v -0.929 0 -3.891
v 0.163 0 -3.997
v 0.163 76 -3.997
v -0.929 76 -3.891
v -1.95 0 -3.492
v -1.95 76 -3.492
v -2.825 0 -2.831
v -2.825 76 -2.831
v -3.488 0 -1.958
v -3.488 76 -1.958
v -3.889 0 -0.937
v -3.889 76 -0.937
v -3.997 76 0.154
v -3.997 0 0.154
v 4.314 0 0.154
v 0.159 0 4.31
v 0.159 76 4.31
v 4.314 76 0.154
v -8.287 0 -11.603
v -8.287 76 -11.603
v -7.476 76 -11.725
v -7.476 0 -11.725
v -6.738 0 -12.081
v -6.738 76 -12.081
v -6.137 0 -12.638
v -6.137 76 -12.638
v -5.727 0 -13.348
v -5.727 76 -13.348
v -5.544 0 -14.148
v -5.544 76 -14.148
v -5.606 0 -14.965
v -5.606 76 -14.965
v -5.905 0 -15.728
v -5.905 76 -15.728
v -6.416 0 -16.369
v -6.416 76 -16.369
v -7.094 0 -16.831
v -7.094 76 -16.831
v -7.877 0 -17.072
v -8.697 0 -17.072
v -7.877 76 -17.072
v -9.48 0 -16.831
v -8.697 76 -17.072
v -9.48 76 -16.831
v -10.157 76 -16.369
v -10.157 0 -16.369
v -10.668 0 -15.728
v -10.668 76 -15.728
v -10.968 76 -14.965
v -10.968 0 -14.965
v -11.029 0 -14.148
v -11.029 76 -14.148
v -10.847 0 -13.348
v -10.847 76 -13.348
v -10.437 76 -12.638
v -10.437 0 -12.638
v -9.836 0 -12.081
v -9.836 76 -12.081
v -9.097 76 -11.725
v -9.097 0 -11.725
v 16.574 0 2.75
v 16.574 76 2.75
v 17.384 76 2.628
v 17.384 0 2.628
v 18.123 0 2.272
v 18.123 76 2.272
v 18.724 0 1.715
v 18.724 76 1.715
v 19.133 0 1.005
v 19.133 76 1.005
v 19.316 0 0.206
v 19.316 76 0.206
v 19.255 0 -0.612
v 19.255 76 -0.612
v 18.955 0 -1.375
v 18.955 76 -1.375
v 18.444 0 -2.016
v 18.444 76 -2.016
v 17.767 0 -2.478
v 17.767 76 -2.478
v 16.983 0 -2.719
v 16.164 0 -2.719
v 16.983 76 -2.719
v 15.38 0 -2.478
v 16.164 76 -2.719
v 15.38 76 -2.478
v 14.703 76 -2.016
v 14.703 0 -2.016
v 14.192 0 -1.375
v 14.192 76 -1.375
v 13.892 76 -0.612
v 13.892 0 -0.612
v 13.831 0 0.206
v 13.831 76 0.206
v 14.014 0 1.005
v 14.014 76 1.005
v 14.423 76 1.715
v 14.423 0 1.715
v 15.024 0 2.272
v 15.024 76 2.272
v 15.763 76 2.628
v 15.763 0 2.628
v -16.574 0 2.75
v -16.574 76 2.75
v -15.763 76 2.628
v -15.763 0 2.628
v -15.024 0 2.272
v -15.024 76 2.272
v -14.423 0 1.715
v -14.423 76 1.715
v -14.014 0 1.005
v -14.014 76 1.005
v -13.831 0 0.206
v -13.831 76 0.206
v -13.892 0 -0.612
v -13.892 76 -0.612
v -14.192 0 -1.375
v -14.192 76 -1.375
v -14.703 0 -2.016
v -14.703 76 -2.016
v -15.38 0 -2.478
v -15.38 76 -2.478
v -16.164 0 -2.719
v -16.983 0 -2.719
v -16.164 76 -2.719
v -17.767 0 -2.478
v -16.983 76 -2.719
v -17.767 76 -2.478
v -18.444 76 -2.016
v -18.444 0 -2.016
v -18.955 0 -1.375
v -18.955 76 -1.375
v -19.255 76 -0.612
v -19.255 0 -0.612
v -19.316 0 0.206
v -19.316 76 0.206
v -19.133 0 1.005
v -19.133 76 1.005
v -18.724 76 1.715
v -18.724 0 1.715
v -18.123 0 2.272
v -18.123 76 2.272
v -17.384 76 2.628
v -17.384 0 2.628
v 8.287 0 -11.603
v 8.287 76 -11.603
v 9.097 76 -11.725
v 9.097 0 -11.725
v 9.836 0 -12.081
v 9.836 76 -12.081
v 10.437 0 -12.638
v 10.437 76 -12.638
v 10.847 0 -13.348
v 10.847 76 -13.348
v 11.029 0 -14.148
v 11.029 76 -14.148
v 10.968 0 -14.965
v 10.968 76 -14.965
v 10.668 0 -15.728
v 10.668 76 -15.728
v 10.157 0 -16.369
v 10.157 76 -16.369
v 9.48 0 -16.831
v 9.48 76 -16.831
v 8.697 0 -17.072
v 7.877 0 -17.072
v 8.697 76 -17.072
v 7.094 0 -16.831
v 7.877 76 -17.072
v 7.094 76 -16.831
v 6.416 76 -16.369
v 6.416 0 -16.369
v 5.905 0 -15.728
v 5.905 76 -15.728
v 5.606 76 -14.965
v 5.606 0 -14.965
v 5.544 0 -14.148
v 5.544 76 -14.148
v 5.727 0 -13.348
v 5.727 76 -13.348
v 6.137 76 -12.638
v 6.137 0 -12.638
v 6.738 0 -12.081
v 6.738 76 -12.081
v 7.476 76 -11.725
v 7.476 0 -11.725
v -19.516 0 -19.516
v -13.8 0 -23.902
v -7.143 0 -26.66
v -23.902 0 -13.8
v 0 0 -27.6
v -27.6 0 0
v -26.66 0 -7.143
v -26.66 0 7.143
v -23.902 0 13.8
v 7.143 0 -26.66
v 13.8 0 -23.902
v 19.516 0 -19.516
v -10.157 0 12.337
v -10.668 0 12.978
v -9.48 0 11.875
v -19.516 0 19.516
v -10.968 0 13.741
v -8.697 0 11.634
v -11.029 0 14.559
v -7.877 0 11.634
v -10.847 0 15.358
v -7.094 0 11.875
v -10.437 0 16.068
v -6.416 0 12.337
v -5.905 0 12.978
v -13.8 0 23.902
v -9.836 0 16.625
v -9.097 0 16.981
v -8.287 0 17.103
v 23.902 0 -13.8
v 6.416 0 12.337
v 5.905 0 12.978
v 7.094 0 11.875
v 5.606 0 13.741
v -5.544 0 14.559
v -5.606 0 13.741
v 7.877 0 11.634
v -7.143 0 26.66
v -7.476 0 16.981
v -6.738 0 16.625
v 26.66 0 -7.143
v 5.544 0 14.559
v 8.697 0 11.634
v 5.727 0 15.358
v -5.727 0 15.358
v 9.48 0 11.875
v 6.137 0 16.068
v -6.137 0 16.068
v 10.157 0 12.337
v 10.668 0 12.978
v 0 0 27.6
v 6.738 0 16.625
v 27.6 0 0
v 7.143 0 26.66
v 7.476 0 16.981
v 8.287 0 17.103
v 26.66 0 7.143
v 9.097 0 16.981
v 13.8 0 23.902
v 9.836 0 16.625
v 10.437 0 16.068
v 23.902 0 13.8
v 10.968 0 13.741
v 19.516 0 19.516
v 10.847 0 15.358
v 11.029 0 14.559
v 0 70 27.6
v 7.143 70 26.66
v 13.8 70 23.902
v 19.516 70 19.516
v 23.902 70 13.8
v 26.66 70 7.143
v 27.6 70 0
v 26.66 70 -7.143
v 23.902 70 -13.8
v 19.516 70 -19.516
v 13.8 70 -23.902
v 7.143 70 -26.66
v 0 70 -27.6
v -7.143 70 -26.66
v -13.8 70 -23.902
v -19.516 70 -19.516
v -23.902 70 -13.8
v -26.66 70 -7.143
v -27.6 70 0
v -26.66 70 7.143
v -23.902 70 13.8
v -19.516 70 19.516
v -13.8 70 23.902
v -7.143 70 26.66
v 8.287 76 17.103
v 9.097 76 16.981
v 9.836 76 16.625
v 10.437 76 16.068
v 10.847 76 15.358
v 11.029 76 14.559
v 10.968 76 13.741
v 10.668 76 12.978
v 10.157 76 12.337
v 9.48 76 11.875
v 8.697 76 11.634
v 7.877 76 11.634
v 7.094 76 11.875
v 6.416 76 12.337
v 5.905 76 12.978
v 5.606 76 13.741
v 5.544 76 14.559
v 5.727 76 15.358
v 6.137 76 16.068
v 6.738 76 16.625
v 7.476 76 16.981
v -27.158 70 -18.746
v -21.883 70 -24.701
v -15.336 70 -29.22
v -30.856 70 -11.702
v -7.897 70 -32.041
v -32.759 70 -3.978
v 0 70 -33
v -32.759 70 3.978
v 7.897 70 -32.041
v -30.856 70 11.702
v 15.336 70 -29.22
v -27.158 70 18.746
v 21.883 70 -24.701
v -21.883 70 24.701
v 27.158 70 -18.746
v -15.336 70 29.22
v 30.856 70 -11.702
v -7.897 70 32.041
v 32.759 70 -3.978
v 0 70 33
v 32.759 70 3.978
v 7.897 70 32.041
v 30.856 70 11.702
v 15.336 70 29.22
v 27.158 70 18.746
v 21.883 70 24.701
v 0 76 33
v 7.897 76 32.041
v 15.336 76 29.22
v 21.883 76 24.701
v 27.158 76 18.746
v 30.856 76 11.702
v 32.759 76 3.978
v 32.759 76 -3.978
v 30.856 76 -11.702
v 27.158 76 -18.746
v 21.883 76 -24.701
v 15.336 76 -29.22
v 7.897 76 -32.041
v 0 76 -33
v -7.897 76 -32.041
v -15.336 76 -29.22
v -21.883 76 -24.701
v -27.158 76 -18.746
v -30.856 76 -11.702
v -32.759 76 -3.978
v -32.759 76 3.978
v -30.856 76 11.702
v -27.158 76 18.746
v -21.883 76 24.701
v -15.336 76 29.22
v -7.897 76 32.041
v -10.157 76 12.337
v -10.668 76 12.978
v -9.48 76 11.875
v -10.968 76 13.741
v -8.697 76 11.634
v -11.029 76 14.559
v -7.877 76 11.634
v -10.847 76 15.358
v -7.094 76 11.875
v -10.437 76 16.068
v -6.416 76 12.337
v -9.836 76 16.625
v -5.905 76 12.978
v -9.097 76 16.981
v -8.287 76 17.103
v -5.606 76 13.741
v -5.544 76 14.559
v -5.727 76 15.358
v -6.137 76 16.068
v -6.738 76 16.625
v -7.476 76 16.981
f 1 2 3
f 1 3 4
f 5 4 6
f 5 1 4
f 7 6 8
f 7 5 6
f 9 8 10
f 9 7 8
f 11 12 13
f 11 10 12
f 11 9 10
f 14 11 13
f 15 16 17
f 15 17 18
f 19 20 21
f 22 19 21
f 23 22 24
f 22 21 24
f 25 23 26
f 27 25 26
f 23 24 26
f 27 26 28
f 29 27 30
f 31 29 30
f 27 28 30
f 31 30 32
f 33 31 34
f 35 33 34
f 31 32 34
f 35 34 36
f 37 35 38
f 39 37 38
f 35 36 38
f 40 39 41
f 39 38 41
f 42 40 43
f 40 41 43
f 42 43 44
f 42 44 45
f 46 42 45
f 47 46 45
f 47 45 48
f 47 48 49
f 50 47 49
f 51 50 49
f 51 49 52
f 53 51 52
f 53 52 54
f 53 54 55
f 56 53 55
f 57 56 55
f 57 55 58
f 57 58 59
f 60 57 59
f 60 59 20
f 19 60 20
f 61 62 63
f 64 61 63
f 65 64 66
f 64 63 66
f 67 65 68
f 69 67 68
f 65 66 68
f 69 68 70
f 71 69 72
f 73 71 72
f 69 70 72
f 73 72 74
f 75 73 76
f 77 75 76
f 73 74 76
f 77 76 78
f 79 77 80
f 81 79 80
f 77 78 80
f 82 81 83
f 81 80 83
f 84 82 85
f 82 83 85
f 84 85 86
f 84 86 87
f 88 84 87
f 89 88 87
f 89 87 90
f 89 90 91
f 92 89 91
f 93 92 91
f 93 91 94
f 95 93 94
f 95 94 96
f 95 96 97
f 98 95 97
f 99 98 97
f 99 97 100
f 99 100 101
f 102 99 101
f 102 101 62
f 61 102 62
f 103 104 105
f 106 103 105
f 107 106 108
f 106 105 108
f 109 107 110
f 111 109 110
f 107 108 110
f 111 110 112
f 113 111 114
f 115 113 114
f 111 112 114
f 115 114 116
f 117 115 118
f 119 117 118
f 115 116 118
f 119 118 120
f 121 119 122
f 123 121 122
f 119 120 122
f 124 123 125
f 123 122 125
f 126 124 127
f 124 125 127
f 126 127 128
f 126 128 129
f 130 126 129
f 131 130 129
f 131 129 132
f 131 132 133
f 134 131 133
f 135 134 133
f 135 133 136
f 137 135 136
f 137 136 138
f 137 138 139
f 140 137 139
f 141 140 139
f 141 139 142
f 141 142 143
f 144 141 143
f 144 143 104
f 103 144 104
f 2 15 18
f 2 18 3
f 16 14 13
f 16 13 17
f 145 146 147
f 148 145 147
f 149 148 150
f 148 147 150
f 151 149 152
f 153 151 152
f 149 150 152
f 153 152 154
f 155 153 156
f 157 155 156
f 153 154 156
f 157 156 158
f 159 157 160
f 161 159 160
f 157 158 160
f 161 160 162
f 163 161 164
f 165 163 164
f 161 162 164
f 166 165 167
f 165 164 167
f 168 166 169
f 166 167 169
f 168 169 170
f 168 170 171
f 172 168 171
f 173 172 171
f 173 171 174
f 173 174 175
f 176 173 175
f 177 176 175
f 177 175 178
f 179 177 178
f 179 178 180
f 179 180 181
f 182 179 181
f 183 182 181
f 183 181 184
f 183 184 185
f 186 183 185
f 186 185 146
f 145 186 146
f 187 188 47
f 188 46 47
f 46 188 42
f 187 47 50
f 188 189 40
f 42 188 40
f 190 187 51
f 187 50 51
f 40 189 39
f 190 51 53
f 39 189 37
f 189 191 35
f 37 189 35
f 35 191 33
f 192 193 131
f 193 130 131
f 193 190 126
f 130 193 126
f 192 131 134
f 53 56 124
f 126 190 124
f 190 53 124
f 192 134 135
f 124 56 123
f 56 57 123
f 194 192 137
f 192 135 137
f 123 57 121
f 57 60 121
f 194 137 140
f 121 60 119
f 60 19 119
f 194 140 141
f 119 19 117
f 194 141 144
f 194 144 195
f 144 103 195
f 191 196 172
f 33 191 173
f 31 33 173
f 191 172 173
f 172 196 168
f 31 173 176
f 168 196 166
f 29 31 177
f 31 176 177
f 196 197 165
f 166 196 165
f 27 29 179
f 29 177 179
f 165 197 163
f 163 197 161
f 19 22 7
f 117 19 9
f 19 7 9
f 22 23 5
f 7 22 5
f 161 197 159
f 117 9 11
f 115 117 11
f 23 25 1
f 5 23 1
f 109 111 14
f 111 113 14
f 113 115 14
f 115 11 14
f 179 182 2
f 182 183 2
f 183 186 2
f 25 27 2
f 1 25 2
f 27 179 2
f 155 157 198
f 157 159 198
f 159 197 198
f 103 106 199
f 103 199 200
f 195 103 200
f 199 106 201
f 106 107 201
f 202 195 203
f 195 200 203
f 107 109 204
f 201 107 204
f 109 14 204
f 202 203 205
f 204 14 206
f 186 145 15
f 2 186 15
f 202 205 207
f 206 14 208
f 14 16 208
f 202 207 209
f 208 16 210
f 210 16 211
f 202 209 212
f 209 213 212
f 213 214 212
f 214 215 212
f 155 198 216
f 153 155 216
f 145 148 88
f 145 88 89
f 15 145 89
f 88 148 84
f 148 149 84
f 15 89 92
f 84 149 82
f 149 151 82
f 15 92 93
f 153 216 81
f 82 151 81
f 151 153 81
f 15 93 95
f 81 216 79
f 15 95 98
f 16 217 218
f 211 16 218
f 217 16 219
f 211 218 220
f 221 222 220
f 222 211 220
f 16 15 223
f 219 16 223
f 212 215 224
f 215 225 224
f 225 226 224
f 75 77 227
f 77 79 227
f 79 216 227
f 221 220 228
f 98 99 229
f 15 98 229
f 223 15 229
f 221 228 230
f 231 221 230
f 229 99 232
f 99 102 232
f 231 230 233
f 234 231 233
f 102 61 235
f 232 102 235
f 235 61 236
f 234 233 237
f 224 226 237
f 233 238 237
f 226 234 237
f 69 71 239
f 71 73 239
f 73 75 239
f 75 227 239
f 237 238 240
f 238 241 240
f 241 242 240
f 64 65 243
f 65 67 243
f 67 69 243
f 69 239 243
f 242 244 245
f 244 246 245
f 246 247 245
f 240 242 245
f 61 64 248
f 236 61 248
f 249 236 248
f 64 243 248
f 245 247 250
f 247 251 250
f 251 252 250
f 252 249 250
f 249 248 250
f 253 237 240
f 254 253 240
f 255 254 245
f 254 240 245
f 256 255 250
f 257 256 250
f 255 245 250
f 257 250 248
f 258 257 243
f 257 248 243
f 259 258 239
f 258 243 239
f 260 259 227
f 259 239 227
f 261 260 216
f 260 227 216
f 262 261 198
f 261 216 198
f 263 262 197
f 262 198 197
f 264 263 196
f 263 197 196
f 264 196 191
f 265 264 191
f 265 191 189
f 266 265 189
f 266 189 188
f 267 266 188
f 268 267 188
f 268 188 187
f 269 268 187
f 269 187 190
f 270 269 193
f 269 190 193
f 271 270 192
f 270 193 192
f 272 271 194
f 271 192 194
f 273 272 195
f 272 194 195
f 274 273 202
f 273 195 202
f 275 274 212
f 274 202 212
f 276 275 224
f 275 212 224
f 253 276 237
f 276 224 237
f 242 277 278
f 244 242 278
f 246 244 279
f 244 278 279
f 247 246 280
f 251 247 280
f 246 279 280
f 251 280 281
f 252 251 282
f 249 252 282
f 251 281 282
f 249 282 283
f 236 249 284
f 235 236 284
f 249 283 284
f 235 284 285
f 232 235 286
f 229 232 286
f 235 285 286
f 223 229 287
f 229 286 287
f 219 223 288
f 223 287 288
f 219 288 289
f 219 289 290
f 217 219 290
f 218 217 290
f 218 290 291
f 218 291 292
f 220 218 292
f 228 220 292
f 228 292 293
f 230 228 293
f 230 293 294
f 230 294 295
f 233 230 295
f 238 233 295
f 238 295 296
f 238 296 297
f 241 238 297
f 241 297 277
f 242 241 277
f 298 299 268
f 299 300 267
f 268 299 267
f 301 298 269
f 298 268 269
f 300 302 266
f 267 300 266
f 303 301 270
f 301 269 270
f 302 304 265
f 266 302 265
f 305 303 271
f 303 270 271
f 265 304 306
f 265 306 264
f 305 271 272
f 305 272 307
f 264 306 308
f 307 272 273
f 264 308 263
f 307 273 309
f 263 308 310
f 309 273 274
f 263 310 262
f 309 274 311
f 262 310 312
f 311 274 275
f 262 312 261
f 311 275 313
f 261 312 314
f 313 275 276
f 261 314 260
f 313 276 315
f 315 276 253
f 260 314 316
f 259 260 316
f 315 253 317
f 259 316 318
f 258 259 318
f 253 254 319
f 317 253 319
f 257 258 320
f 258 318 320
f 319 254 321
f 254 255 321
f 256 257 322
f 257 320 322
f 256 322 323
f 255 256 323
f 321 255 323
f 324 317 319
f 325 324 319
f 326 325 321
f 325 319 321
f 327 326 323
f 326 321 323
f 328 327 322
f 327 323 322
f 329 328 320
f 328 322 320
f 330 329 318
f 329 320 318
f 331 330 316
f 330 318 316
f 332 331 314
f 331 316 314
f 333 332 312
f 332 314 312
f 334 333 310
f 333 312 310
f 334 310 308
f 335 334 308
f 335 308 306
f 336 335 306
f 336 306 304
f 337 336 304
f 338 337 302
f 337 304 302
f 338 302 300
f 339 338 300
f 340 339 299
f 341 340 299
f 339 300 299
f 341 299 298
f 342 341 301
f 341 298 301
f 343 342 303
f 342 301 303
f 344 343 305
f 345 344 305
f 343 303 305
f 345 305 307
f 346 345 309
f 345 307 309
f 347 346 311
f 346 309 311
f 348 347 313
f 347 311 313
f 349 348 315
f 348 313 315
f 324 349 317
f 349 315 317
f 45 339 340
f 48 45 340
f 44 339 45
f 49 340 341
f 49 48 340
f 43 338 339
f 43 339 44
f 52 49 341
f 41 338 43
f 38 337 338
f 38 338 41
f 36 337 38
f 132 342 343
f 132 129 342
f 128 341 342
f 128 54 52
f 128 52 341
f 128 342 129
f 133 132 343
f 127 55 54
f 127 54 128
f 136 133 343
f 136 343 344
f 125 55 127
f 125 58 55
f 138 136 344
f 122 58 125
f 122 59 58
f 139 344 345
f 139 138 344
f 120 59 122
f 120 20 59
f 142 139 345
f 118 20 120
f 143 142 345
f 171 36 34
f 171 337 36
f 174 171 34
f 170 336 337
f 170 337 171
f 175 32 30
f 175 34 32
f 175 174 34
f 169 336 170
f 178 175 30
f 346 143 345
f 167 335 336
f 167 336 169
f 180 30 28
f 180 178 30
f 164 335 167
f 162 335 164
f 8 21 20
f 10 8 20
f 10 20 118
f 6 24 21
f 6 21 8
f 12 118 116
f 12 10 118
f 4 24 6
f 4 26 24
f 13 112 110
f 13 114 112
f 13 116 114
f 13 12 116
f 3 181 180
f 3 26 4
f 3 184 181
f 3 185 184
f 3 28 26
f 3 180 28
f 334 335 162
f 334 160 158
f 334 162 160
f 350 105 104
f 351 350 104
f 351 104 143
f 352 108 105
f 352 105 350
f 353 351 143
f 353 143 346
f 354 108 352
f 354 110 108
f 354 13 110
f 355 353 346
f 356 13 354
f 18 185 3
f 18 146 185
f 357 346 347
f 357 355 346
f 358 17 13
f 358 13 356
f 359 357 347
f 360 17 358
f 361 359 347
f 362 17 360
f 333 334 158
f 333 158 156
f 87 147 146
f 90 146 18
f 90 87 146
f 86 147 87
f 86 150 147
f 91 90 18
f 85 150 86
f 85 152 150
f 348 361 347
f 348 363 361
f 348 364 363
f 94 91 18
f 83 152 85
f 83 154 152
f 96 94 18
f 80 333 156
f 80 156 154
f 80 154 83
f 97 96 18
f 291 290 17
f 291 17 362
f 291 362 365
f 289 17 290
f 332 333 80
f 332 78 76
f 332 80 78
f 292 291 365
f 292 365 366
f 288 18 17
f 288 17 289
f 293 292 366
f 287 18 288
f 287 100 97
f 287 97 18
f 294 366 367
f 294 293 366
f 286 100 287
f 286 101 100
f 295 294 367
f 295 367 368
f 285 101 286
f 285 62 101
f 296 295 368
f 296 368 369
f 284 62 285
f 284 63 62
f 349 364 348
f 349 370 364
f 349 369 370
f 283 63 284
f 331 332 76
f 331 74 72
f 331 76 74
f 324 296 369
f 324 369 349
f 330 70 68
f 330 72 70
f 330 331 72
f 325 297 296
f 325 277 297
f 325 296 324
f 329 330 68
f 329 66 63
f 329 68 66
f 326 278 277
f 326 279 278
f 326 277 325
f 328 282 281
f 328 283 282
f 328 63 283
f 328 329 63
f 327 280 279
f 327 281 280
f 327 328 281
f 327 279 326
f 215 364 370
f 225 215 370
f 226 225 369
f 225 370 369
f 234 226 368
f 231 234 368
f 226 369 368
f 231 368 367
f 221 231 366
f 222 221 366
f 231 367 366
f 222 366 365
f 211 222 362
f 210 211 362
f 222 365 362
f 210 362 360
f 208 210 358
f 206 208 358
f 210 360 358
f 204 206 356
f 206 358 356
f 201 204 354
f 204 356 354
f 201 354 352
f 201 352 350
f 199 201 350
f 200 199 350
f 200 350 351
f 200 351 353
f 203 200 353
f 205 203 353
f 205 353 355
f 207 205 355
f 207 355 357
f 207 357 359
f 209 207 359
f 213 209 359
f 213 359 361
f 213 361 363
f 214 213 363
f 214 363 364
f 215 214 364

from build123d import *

# Parameters (mm, degrees)
SKETCH2_R           = 27.6
BOSS_EXTRUDE1_DEPTH = 70
CUT_EXTRUDE1_DEPTH  = 50
SKETCH3_R           = 2.75
CUT_EXTRUDE2_DEPTH  = 110
SKETCH4_R           = 33
BOSS_EXTRUDE2_DEPTH = 6
CUT_EXTRUDE3_START  = 6
SKETCH3_2_R         = 2.75
CUT_EXTRUDE3_DEPTH  = 6
CUT_EXTRUDE4_DEPTH  = 81


with BuildPart() as part:
    # Sketch2 → Boss-Extrude1 (new body)
    with BuildSketch(Plane(origin=(0, 0, 0), x_dir=(1, 0, 0), z_dir=(0, 1, 0))):
        Circle(SKETCH2_R)
    extrude(amount=BOSS_EXTRUDE1_DEPTH)

    # Sketch2<4> → Cut-Extrude1 (cut)
    with BuildSketch(Plane(origin=(0, 0, 0), x_dir=(1, 0, 0), z_dir=(0, 1, 0))):
        with BuildLine():
            Line((-3.997017731, -0.154432059), (0.158545764, -4.309995554))
            Line((0.158545764, -4.309995554), (4.314106781, -0.154434537))
            Line((4.314106781, -0.154434537), (0.162994526, 3.996677718))
            ThreePointArc((0.162994526, 3.996677718), (-2.825395827, 2.831455177), (-3.997017731, -0.154432059))
        make_face()
    extrude(amount=CUT_EXTRUDE1_DEPTH, mode=Mode.SUBTRACT)

    # Sketch3 → Cut-Extrude2 (cut)
    with BuildSketch(Plane(origin=(0, 70, 0), x_dir=(1, 0, 0), z_dir=(0, 1, 0))):
        with Locations((-8.28675, 14.35307203)):
            Circle(SKETCH3_R)
        with Locations((-16.5735, 0)):
            Circle(SKETCH3_R)
        with Locations((-8.28675, -14.35307203)):
            Circle(SKETCH3_R)
        with Locations((8.28675, -14.35307203)):
            Circle(SKETCH3_R)
        with Locations((16.5735, 0)):
            Circle(SKETCH3_R)
        with Locations((8.28675, 14.35307203)):
            Circle(SKETCH3_R)
    extrude(amount=-CUT_EXTRUDE2_DEPTH, mode=Mode.SUBTRACT)

    # Sketch4 → Boss-Extrude2 (add)
    with BuildSketch(Plane(origin=(0, 70, 0), x_dir=(1, 0, 0), z_dir=(0, 1, 0))):
        Circle(SKETCH4_R)
    extrude(amount=BOSS_EXTRUDE2_DEPTH)

    # Sketch3<2> → Cut-Extrude3 (cut)
    with BuildSketch(Plane(origin=(0, 70, 0), x_dir=(1, 0, 0), z_dir=(0, 1, 0)).offset(CUT_EXTRUDE3_START)):
        with Locations((-8.28675, 14.35307203)):
            Circle(SKETCH3_2_R)
        with Locations((-16.5735, 0)):
            Circle(SKETCH3_2_R)
        with Locations((-8.28675, -14.35307203)):
            Circle(SKETCH3_2_R)
        with Locations((8.28675, -14.35307203)):
            Circle(SKETCH3_2_R)
        with Locations((16.5735, 0)):
            Circle(SKETCH3_2_R)
        with Locations((8.28675, 14.35307203)):
            Circle(SKETCH3_2_R)
    extrude(amount=-CUT_EXTRUDE3_DEPTH, mode=Mode.SUBTRACT)

    # Sketch2<5> → Cut-Extrude4 (cut)
    with BuildSketch(Plane(origin=(0, 0, 0), x_dir=(1, 0, 0), z_dir=(0, 1, 0))):
        with BuildLine():
            Line((-3.997017731, -0.154432059), (0.158545764, -4.309995554))
            Line((0.158545764, -4.309995554), (4.314106781, -0.154434537))
            Line((4.314106781, -0.154434537), (0.162994526, 3.996677718))
            ThreePointArc((0.162994526, 3.996677718), (-2.825395827, 2.831455177), (-3.997017731, -0.154432059))
        make_face()
    extrude(amount=CUT_EXTRUDE4_DEPTH, mode=Mode.SUBTRACT)


solid = part.part
